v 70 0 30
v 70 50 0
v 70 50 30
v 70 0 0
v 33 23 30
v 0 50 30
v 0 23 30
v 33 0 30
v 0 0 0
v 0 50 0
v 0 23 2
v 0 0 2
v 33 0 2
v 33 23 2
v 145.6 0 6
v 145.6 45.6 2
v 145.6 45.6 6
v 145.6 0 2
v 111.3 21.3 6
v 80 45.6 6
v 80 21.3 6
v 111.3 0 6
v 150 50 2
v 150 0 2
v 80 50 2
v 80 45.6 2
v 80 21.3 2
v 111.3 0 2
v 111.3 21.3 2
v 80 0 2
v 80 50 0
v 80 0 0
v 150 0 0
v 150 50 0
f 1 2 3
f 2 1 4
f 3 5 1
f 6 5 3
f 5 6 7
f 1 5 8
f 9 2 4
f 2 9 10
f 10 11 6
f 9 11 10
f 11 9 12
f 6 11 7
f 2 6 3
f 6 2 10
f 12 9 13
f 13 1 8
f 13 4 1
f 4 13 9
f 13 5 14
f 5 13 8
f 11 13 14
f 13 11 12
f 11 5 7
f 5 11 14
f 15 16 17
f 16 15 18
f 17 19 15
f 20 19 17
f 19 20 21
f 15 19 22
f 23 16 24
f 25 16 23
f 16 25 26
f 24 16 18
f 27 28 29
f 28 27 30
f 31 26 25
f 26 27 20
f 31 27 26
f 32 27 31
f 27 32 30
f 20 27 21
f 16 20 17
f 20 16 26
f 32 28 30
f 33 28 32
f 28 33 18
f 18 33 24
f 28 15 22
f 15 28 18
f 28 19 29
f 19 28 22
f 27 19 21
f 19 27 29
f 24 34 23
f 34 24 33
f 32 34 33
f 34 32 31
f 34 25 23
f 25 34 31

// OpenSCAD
// Two-part enclosure for a small electronics board (e.g. Arduino temperature logger)
// Both parts are printed in the same file, side by side on the bed with a 10 mm gap.

// ---------- Global ----------
$fn = 64;

// ---------- Part 1: Box ----------
box_outer_x = 70;   // outer X size of the box
box_outer_y = 50;   // outer Y size of the box
box_outer_z = 30;   // outer Z height of the box
box_wall    = 2;    // wall thickness
box_floor   = 2;    // floor thickness
// The box is open at the top.

// ---------- Part 2: Lid (printed upside down) ----------
lid_plate_x = 70;   // plate X size
lid_plate_y = 50;   // plate Y size
lid_plate_z = 2;    // plate thickness (lies on the bed)
lip_wall    = 1.5;  // lip wall thickness
lip_height  = 4;    // lip height (extends upward from the plate in print orientation)
// Lip outer size: 65.6 x 45.6 mm, centred on the plate.
// This gives 0.2 mm clearance on each side relative to the box inner opening (66 x 46).
lip_outer_x = 65.6;
lip_outer_y = 45.6;

// ---------- Layout ----------
// Box is centred on the origin in X and Y.
// Lid is placed on the +X side of the box with a 10 mm gap between them.
// The gap is measured between the nearest faces of the two parts.
// Box extends from x = -35 to x = +35.
// Lid plate extends from x = 35 + 10 = 45 to x = 45 + 70 = 115.
// So the lid centre in X is at 45 + 35 = 80.
lid_offset_x = box_outer_x / 2 + 10 + lid_plate_x / 2;  // 35 + 10 + 35 = 80

// ---------- Part 1: Box ----------
// The box is a rectangular shell: outer box minus inner cavity.
// The cavity is open at the top (z = box_outer_z), so the cutting box extends
// 1 mm past the top face to ensure a clean cut with no coplanar faces.
module box() {
    // Outer solid
    difference() {
        cube([box_outer_x, box_outer_y, box_outer_z], center = [true, true, false]);
        
        // Inner cavity: starts at z = box_floor, extends 1 mm past the top
        inner_x = box_outer_x - 2 * box_wall;  // 66 mm
        inner_y = box_outer_y - 2 * box_wall;  // 46 mm
        inner_z = box_outer_z - box_floor + 1; // extends 1 mm past top for clean cut
        
        translate([-inner_x/2, -inner_y/2, box_floor])
            cube([inner_x, inner_y, inner_z], center = [true, true, false]);
    }
}

// ---------- Part 2: Lid (printed upside down) ----------
// The lid consists of a flat plate on the bed and a rectangular lip on top.
// When assembled, the lip slides into the box opening.
module lid() {
    // Plate: 70 x 50 x 2 mm, lying on the bed (z = 0 to z = 2)
    // Lip: a rectangular ring (hollow rectangle) on top of the plate
    // Outer size: 65.6 x 45.6 mm, wall thickness: 1.5 mm, height: 4 mm
    // The lip sits on top of the plate, so it starts at z = lid_plate_z
    union() {
        // Plate
        cube([lid_plate_x, lid_plate_y, lid_plate_z], center = [true, true, false]);
        
        // Lip (hollow rectangular ring)
        translate([0, 0, lid_plate_z])
            difference() {
                // Outer lip block
                cube([lip_outer_x, lip_outer_y, lip_height], center = [true, true, false]);
                
                // Inner cavity of the lip, extends 1 mm past the top for clean cut
                lip_inner_x = lip_outer_x - 2 * lip_wall;  // 62.6 mm
                lip_inner_y = lip_outer_y - 2 * lip_wall;  // 42.6 mm
                lip_inner_z = lip_height + 1;
                
                translate([-lip_inner_x/2, -lip_inner_y/2, 0])
                    cube([lip_inner_x, lip_inner_y, lip_inner_z], center = [true, true, false]);
            }
    }
}

// ---------- Assemble both parts side by side ----------
// Box is centred on the origin.
// Lid is translated to the +X side with a 10 mm gap.
union() {
    // Part 1: Box at origin
    box();
    
    // Part 2: Lid on the +X side
    translate([lid_offset_x, 0, 0])
        lid();
}
